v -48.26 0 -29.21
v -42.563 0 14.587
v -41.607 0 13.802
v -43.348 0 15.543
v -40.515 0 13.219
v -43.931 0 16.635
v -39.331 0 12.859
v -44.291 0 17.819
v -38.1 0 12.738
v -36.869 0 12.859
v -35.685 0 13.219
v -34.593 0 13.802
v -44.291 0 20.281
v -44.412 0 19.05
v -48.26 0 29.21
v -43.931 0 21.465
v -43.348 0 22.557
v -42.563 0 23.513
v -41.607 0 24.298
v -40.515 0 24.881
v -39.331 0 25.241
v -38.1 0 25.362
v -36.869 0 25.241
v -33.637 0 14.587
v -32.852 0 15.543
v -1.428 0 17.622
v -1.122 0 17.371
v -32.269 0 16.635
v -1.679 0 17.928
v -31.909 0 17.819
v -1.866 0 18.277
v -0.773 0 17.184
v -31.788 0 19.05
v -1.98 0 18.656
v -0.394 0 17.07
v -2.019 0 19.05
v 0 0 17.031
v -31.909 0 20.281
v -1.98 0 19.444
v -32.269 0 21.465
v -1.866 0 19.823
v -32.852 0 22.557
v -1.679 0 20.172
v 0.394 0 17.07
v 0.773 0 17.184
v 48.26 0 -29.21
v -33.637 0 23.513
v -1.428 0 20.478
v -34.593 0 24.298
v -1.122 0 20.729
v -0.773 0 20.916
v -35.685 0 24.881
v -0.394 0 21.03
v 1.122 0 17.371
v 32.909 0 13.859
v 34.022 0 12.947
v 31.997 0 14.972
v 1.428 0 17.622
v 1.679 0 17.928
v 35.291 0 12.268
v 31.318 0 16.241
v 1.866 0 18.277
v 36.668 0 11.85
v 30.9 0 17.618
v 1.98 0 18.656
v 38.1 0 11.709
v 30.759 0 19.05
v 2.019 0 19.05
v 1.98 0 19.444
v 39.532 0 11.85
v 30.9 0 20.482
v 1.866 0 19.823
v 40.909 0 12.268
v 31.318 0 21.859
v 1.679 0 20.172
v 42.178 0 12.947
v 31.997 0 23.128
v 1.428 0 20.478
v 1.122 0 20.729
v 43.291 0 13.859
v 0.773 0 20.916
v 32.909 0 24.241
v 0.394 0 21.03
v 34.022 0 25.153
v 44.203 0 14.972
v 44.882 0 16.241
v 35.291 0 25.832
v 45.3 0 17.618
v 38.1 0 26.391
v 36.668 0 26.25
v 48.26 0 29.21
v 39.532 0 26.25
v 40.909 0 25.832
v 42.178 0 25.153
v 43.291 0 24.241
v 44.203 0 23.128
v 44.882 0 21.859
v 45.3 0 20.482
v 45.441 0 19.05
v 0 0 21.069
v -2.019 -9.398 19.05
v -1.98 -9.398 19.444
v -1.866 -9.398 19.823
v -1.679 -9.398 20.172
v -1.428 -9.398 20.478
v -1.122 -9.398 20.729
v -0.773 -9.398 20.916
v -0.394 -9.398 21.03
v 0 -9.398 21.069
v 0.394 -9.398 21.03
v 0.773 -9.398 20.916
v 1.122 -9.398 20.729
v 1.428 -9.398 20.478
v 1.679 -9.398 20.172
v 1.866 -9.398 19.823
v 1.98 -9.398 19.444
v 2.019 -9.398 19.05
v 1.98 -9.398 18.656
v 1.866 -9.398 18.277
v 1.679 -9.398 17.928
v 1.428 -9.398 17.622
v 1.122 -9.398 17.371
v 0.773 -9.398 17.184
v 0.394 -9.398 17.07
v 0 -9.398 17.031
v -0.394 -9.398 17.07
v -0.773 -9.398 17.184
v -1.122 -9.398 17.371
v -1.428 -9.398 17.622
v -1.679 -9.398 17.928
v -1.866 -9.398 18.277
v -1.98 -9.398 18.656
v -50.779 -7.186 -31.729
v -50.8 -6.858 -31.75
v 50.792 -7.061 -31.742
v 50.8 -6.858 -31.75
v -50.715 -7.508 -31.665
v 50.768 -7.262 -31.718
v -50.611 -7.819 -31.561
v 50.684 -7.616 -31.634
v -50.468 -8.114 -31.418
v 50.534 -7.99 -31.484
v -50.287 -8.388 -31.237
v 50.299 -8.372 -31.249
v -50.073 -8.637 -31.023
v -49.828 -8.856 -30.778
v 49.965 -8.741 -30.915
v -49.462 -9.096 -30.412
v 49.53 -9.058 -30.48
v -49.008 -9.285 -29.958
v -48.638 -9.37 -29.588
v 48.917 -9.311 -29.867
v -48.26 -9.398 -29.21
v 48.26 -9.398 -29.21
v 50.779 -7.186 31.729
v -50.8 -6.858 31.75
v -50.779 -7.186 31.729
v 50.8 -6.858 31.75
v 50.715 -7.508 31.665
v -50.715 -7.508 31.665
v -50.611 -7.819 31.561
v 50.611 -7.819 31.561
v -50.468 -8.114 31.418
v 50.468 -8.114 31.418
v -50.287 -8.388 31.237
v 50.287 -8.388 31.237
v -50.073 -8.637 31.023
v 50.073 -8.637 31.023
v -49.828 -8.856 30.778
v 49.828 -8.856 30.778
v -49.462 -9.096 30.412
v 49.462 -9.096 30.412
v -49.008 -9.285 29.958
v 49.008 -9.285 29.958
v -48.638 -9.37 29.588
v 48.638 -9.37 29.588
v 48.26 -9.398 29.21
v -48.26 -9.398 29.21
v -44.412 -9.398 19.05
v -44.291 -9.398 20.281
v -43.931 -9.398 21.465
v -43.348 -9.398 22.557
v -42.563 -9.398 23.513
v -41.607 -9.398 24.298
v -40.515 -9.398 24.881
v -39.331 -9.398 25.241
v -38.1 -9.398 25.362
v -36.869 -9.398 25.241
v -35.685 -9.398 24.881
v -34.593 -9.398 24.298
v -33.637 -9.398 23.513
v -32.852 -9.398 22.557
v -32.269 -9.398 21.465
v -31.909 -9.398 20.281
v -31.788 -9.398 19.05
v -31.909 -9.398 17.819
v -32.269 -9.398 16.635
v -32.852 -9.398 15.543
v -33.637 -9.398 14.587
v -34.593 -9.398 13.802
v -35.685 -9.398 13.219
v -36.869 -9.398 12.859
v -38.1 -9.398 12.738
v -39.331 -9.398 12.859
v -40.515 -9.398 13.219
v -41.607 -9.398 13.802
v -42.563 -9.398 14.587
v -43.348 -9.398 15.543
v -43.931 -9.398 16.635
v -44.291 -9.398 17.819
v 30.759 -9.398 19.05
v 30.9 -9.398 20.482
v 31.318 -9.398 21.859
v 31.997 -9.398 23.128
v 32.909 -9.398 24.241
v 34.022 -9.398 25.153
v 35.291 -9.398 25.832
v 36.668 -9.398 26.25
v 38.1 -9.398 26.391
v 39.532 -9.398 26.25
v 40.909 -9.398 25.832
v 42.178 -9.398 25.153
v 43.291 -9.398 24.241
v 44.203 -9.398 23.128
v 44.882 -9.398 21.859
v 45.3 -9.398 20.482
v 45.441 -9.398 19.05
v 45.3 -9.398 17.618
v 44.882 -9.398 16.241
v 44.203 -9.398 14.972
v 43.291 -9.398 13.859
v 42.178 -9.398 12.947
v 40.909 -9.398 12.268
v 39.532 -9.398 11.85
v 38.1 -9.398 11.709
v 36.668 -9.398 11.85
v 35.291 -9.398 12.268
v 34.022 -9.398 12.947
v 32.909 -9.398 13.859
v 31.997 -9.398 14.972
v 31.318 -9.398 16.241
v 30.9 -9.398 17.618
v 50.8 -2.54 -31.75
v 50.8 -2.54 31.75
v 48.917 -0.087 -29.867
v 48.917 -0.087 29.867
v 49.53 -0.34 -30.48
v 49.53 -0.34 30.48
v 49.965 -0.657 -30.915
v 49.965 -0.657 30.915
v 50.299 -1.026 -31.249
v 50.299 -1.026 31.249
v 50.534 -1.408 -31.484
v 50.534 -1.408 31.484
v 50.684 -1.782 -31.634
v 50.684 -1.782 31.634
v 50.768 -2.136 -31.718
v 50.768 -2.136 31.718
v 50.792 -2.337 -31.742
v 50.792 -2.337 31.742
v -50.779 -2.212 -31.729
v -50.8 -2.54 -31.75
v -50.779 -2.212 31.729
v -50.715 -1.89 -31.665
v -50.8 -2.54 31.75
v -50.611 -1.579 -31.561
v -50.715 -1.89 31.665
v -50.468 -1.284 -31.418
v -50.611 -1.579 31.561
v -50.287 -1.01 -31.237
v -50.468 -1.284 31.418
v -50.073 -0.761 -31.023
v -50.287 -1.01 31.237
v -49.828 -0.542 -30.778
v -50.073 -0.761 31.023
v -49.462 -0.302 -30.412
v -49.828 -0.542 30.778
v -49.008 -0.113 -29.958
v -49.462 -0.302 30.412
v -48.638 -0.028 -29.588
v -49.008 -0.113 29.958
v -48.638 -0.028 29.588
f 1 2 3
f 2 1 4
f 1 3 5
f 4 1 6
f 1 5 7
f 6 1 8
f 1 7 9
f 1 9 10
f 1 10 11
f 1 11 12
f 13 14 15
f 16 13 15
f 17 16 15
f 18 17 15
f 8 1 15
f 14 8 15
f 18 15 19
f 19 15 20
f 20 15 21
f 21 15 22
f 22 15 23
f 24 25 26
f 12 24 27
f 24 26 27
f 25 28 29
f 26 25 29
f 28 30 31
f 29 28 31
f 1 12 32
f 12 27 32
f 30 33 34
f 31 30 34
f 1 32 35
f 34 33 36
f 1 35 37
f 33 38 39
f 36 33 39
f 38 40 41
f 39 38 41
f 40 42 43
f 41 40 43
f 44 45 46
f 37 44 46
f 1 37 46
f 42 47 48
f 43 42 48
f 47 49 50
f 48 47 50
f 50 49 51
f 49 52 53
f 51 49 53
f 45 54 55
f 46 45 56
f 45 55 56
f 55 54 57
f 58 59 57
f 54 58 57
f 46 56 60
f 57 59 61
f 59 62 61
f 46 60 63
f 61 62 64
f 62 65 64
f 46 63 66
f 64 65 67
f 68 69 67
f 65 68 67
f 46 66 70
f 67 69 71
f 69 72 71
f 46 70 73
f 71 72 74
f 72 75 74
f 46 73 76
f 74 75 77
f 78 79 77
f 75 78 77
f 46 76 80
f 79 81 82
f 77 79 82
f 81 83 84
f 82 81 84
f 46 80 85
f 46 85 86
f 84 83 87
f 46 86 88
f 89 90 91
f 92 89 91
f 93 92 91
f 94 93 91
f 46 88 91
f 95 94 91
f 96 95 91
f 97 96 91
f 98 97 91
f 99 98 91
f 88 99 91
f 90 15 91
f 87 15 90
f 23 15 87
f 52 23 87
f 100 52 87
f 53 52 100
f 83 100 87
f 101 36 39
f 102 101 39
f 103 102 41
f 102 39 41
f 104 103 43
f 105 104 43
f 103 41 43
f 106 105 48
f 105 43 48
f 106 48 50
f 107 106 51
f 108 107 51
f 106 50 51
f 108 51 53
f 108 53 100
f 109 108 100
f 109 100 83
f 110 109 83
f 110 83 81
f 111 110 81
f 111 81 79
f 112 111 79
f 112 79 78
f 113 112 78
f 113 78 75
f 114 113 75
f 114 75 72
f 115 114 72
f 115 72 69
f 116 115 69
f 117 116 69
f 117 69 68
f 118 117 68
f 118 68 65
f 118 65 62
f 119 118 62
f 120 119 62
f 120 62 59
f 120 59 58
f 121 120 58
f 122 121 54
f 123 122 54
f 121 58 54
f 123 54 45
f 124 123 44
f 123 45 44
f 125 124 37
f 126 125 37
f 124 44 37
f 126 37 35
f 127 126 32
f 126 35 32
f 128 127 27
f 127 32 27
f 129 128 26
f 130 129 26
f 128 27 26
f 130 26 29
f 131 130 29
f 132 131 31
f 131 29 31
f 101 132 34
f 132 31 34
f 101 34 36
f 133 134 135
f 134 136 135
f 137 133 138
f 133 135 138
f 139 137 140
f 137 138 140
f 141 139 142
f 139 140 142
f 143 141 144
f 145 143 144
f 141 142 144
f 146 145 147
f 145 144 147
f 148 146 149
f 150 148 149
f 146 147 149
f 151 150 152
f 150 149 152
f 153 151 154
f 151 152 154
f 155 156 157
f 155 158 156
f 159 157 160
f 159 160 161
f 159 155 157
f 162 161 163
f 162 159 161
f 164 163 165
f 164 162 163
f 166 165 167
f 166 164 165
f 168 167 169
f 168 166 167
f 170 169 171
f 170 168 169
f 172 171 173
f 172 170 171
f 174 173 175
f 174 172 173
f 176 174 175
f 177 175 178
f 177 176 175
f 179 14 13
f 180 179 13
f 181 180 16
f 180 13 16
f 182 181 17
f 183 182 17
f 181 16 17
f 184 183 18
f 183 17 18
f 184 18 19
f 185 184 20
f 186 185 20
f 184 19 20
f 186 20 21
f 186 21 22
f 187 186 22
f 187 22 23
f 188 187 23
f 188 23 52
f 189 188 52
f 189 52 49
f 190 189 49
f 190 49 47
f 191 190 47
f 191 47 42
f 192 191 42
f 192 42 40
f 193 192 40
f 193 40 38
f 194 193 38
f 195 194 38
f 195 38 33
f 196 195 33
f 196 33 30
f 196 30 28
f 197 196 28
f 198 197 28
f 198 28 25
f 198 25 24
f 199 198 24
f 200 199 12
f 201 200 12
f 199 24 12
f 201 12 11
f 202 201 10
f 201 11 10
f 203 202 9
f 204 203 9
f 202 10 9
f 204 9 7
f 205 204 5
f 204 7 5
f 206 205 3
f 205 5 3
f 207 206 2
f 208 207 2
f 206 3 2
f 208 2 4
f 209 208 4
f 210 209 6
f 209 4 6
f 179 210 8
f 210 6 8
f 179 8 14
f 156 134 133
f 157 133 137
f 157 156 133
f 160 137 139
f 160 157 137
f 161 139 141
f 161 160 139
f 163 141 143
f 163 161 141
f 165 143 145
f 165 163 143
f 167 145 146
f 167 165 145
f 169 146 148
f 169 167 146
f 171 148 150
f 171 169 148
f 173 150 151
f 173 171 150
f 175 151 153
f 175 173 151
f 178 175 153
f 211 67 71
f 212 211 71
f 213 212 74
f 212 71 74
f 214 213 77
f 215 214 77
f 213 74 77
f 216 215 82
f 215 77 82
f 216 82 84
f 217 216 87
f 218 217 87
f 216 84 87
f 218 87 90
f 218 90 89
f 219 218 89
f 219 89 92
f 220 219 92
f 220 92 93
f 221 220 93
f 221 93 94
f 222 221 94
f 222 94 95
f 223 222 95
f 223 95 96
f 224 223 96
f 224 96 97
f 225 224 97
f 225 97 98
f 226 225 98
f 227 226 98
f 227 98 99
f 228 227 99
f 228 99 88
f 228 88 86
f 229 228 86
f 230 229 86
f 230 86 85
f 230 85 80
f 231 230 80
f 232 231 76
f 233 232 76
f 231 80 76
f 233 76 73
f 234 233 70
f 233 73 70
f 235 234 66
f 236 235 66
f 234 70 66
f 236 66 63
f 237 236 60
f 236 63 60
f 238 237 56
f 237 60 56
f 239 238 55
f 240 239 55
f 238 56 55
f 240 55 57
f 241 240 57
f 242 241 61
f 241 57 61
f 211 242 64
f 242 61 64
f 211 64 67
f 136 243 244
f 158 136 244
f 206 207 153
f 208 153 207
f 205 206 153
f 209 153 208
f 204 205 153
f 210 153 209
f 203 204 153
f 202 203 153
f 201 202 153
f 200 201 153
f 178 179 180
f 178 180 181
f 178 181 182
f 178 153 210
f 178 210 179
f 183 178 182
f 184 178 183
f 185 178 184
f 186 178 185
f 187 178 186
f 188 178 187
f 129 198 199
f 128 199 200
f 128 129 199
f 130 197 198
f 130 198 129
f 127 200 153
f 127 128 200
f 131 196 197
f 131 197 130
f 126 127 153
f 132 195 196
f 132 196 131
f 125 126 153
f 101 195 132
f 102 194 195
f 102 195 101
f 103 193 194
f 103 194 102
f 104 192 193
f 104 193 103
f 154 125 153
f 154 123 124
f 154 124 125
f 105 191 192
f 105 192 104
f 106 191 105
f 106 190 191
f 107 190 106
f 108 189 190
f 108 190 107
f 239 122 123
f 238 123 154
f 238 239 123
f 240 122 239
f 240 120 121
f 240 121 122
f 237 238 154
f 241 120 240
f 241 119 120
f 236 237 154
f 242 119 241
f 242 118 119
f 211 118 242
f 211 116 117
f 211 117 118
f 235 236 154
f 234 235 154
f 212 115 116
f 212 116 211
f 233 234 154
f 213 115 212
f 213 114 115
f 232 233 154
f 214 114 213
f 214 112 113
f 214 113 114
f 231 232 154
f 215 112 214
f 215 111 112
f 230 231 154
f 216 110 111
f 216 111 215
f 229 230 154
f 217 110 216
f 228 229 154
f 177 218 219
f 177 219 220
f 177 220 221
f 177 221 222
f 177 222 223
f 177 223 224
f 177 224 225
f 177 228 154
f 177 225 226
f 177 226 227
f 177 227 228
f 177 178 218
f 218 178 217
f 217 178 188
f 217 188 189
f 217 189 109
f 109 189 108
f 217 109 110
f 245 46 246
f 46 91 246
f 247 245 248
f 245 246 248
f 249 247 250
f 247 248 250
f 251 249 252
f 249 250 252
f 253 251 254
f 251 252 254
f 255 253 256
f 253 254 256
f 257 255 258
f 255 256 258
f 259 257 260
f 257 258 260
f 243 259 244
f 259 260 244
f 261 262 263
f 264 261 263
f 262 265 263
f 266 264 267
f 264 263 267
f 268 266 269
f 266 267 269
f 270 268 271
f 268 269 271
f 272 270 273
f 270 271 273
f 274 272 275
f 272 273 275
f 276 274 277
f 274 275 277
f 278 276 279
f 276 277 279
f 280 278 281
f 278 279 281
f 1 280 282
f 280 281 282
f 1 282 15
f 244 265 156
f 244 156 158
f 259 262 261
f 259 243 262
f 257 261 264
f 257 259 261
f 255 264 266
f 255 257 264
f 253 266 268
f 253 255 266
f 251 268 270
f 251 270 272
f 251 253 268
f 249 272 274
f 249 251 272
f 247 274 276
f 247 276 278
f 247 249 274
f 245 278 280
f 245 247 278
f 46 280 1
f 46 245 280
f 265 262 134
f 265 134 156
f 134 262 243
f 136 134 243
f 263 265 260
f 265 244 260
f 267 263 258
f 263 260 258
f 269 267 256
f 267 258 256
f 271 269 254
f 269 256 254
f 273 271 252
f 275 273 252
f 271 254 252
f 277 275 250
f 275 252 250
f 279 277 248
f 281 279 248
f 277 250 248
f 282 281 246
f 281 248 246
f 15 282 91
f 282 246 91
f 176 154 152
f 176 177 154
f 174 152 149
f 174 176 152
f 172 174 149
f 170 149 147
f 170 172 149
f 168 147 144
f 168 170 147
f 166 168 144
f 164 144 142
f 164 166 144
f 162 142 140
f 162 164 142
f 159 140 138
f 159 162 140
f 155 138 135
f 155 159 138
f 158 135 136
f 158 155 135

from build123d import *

# Parameters (mm, degrees)
F0_W     = 101.6
F0_H     = 63.5
F1_DEPTH = 9.398
F3_D     = 12.6238
F4_D     = 14.6812
F5_R     = 2.54
F6_D     = 4.0386


with BuildPart() as f1:
    # F0 (on Front) → F1 (new body)
    with BuildSketch(Plane.XZ):
        Rectangle(F0_W, F0_H)
    extrude(amount=F1_DEPTH)

    # F3 (through all)
    with Locations(Plane.XZ.offset(9.398)):
        with Locations((-38.1, 19.05)):
            Hole(F3_D / 2)

    # F4 (through all)
    with Locations(Plane.XZ.offset(9.398)):
        with Locations((38.1, 19.05)):
            Hole(F4_D / 2)

    # F5
    f5_edges = [f1.edges().sort_by_distance(p)[0] for p in [
        (0, -9.398, 31.75),
        (-50.8, -9.398, 0),
        (50.8, -9.398, 0),
        (0, -9.398, -31.75),
        (50.8, 0, 0),
        (-50.8, 0, 0),
        (0, 0, -31.75),
        (0, 0, 31.75),
    ]]
    fillet(f5_edges, radius=F5_R)

    # F6 (through all)
    with Locations(Plane.XZ.offset(9.398)):
        with Locations((0, 19.05)):
            Hole(F6_D / 2)


solid = f1.part
